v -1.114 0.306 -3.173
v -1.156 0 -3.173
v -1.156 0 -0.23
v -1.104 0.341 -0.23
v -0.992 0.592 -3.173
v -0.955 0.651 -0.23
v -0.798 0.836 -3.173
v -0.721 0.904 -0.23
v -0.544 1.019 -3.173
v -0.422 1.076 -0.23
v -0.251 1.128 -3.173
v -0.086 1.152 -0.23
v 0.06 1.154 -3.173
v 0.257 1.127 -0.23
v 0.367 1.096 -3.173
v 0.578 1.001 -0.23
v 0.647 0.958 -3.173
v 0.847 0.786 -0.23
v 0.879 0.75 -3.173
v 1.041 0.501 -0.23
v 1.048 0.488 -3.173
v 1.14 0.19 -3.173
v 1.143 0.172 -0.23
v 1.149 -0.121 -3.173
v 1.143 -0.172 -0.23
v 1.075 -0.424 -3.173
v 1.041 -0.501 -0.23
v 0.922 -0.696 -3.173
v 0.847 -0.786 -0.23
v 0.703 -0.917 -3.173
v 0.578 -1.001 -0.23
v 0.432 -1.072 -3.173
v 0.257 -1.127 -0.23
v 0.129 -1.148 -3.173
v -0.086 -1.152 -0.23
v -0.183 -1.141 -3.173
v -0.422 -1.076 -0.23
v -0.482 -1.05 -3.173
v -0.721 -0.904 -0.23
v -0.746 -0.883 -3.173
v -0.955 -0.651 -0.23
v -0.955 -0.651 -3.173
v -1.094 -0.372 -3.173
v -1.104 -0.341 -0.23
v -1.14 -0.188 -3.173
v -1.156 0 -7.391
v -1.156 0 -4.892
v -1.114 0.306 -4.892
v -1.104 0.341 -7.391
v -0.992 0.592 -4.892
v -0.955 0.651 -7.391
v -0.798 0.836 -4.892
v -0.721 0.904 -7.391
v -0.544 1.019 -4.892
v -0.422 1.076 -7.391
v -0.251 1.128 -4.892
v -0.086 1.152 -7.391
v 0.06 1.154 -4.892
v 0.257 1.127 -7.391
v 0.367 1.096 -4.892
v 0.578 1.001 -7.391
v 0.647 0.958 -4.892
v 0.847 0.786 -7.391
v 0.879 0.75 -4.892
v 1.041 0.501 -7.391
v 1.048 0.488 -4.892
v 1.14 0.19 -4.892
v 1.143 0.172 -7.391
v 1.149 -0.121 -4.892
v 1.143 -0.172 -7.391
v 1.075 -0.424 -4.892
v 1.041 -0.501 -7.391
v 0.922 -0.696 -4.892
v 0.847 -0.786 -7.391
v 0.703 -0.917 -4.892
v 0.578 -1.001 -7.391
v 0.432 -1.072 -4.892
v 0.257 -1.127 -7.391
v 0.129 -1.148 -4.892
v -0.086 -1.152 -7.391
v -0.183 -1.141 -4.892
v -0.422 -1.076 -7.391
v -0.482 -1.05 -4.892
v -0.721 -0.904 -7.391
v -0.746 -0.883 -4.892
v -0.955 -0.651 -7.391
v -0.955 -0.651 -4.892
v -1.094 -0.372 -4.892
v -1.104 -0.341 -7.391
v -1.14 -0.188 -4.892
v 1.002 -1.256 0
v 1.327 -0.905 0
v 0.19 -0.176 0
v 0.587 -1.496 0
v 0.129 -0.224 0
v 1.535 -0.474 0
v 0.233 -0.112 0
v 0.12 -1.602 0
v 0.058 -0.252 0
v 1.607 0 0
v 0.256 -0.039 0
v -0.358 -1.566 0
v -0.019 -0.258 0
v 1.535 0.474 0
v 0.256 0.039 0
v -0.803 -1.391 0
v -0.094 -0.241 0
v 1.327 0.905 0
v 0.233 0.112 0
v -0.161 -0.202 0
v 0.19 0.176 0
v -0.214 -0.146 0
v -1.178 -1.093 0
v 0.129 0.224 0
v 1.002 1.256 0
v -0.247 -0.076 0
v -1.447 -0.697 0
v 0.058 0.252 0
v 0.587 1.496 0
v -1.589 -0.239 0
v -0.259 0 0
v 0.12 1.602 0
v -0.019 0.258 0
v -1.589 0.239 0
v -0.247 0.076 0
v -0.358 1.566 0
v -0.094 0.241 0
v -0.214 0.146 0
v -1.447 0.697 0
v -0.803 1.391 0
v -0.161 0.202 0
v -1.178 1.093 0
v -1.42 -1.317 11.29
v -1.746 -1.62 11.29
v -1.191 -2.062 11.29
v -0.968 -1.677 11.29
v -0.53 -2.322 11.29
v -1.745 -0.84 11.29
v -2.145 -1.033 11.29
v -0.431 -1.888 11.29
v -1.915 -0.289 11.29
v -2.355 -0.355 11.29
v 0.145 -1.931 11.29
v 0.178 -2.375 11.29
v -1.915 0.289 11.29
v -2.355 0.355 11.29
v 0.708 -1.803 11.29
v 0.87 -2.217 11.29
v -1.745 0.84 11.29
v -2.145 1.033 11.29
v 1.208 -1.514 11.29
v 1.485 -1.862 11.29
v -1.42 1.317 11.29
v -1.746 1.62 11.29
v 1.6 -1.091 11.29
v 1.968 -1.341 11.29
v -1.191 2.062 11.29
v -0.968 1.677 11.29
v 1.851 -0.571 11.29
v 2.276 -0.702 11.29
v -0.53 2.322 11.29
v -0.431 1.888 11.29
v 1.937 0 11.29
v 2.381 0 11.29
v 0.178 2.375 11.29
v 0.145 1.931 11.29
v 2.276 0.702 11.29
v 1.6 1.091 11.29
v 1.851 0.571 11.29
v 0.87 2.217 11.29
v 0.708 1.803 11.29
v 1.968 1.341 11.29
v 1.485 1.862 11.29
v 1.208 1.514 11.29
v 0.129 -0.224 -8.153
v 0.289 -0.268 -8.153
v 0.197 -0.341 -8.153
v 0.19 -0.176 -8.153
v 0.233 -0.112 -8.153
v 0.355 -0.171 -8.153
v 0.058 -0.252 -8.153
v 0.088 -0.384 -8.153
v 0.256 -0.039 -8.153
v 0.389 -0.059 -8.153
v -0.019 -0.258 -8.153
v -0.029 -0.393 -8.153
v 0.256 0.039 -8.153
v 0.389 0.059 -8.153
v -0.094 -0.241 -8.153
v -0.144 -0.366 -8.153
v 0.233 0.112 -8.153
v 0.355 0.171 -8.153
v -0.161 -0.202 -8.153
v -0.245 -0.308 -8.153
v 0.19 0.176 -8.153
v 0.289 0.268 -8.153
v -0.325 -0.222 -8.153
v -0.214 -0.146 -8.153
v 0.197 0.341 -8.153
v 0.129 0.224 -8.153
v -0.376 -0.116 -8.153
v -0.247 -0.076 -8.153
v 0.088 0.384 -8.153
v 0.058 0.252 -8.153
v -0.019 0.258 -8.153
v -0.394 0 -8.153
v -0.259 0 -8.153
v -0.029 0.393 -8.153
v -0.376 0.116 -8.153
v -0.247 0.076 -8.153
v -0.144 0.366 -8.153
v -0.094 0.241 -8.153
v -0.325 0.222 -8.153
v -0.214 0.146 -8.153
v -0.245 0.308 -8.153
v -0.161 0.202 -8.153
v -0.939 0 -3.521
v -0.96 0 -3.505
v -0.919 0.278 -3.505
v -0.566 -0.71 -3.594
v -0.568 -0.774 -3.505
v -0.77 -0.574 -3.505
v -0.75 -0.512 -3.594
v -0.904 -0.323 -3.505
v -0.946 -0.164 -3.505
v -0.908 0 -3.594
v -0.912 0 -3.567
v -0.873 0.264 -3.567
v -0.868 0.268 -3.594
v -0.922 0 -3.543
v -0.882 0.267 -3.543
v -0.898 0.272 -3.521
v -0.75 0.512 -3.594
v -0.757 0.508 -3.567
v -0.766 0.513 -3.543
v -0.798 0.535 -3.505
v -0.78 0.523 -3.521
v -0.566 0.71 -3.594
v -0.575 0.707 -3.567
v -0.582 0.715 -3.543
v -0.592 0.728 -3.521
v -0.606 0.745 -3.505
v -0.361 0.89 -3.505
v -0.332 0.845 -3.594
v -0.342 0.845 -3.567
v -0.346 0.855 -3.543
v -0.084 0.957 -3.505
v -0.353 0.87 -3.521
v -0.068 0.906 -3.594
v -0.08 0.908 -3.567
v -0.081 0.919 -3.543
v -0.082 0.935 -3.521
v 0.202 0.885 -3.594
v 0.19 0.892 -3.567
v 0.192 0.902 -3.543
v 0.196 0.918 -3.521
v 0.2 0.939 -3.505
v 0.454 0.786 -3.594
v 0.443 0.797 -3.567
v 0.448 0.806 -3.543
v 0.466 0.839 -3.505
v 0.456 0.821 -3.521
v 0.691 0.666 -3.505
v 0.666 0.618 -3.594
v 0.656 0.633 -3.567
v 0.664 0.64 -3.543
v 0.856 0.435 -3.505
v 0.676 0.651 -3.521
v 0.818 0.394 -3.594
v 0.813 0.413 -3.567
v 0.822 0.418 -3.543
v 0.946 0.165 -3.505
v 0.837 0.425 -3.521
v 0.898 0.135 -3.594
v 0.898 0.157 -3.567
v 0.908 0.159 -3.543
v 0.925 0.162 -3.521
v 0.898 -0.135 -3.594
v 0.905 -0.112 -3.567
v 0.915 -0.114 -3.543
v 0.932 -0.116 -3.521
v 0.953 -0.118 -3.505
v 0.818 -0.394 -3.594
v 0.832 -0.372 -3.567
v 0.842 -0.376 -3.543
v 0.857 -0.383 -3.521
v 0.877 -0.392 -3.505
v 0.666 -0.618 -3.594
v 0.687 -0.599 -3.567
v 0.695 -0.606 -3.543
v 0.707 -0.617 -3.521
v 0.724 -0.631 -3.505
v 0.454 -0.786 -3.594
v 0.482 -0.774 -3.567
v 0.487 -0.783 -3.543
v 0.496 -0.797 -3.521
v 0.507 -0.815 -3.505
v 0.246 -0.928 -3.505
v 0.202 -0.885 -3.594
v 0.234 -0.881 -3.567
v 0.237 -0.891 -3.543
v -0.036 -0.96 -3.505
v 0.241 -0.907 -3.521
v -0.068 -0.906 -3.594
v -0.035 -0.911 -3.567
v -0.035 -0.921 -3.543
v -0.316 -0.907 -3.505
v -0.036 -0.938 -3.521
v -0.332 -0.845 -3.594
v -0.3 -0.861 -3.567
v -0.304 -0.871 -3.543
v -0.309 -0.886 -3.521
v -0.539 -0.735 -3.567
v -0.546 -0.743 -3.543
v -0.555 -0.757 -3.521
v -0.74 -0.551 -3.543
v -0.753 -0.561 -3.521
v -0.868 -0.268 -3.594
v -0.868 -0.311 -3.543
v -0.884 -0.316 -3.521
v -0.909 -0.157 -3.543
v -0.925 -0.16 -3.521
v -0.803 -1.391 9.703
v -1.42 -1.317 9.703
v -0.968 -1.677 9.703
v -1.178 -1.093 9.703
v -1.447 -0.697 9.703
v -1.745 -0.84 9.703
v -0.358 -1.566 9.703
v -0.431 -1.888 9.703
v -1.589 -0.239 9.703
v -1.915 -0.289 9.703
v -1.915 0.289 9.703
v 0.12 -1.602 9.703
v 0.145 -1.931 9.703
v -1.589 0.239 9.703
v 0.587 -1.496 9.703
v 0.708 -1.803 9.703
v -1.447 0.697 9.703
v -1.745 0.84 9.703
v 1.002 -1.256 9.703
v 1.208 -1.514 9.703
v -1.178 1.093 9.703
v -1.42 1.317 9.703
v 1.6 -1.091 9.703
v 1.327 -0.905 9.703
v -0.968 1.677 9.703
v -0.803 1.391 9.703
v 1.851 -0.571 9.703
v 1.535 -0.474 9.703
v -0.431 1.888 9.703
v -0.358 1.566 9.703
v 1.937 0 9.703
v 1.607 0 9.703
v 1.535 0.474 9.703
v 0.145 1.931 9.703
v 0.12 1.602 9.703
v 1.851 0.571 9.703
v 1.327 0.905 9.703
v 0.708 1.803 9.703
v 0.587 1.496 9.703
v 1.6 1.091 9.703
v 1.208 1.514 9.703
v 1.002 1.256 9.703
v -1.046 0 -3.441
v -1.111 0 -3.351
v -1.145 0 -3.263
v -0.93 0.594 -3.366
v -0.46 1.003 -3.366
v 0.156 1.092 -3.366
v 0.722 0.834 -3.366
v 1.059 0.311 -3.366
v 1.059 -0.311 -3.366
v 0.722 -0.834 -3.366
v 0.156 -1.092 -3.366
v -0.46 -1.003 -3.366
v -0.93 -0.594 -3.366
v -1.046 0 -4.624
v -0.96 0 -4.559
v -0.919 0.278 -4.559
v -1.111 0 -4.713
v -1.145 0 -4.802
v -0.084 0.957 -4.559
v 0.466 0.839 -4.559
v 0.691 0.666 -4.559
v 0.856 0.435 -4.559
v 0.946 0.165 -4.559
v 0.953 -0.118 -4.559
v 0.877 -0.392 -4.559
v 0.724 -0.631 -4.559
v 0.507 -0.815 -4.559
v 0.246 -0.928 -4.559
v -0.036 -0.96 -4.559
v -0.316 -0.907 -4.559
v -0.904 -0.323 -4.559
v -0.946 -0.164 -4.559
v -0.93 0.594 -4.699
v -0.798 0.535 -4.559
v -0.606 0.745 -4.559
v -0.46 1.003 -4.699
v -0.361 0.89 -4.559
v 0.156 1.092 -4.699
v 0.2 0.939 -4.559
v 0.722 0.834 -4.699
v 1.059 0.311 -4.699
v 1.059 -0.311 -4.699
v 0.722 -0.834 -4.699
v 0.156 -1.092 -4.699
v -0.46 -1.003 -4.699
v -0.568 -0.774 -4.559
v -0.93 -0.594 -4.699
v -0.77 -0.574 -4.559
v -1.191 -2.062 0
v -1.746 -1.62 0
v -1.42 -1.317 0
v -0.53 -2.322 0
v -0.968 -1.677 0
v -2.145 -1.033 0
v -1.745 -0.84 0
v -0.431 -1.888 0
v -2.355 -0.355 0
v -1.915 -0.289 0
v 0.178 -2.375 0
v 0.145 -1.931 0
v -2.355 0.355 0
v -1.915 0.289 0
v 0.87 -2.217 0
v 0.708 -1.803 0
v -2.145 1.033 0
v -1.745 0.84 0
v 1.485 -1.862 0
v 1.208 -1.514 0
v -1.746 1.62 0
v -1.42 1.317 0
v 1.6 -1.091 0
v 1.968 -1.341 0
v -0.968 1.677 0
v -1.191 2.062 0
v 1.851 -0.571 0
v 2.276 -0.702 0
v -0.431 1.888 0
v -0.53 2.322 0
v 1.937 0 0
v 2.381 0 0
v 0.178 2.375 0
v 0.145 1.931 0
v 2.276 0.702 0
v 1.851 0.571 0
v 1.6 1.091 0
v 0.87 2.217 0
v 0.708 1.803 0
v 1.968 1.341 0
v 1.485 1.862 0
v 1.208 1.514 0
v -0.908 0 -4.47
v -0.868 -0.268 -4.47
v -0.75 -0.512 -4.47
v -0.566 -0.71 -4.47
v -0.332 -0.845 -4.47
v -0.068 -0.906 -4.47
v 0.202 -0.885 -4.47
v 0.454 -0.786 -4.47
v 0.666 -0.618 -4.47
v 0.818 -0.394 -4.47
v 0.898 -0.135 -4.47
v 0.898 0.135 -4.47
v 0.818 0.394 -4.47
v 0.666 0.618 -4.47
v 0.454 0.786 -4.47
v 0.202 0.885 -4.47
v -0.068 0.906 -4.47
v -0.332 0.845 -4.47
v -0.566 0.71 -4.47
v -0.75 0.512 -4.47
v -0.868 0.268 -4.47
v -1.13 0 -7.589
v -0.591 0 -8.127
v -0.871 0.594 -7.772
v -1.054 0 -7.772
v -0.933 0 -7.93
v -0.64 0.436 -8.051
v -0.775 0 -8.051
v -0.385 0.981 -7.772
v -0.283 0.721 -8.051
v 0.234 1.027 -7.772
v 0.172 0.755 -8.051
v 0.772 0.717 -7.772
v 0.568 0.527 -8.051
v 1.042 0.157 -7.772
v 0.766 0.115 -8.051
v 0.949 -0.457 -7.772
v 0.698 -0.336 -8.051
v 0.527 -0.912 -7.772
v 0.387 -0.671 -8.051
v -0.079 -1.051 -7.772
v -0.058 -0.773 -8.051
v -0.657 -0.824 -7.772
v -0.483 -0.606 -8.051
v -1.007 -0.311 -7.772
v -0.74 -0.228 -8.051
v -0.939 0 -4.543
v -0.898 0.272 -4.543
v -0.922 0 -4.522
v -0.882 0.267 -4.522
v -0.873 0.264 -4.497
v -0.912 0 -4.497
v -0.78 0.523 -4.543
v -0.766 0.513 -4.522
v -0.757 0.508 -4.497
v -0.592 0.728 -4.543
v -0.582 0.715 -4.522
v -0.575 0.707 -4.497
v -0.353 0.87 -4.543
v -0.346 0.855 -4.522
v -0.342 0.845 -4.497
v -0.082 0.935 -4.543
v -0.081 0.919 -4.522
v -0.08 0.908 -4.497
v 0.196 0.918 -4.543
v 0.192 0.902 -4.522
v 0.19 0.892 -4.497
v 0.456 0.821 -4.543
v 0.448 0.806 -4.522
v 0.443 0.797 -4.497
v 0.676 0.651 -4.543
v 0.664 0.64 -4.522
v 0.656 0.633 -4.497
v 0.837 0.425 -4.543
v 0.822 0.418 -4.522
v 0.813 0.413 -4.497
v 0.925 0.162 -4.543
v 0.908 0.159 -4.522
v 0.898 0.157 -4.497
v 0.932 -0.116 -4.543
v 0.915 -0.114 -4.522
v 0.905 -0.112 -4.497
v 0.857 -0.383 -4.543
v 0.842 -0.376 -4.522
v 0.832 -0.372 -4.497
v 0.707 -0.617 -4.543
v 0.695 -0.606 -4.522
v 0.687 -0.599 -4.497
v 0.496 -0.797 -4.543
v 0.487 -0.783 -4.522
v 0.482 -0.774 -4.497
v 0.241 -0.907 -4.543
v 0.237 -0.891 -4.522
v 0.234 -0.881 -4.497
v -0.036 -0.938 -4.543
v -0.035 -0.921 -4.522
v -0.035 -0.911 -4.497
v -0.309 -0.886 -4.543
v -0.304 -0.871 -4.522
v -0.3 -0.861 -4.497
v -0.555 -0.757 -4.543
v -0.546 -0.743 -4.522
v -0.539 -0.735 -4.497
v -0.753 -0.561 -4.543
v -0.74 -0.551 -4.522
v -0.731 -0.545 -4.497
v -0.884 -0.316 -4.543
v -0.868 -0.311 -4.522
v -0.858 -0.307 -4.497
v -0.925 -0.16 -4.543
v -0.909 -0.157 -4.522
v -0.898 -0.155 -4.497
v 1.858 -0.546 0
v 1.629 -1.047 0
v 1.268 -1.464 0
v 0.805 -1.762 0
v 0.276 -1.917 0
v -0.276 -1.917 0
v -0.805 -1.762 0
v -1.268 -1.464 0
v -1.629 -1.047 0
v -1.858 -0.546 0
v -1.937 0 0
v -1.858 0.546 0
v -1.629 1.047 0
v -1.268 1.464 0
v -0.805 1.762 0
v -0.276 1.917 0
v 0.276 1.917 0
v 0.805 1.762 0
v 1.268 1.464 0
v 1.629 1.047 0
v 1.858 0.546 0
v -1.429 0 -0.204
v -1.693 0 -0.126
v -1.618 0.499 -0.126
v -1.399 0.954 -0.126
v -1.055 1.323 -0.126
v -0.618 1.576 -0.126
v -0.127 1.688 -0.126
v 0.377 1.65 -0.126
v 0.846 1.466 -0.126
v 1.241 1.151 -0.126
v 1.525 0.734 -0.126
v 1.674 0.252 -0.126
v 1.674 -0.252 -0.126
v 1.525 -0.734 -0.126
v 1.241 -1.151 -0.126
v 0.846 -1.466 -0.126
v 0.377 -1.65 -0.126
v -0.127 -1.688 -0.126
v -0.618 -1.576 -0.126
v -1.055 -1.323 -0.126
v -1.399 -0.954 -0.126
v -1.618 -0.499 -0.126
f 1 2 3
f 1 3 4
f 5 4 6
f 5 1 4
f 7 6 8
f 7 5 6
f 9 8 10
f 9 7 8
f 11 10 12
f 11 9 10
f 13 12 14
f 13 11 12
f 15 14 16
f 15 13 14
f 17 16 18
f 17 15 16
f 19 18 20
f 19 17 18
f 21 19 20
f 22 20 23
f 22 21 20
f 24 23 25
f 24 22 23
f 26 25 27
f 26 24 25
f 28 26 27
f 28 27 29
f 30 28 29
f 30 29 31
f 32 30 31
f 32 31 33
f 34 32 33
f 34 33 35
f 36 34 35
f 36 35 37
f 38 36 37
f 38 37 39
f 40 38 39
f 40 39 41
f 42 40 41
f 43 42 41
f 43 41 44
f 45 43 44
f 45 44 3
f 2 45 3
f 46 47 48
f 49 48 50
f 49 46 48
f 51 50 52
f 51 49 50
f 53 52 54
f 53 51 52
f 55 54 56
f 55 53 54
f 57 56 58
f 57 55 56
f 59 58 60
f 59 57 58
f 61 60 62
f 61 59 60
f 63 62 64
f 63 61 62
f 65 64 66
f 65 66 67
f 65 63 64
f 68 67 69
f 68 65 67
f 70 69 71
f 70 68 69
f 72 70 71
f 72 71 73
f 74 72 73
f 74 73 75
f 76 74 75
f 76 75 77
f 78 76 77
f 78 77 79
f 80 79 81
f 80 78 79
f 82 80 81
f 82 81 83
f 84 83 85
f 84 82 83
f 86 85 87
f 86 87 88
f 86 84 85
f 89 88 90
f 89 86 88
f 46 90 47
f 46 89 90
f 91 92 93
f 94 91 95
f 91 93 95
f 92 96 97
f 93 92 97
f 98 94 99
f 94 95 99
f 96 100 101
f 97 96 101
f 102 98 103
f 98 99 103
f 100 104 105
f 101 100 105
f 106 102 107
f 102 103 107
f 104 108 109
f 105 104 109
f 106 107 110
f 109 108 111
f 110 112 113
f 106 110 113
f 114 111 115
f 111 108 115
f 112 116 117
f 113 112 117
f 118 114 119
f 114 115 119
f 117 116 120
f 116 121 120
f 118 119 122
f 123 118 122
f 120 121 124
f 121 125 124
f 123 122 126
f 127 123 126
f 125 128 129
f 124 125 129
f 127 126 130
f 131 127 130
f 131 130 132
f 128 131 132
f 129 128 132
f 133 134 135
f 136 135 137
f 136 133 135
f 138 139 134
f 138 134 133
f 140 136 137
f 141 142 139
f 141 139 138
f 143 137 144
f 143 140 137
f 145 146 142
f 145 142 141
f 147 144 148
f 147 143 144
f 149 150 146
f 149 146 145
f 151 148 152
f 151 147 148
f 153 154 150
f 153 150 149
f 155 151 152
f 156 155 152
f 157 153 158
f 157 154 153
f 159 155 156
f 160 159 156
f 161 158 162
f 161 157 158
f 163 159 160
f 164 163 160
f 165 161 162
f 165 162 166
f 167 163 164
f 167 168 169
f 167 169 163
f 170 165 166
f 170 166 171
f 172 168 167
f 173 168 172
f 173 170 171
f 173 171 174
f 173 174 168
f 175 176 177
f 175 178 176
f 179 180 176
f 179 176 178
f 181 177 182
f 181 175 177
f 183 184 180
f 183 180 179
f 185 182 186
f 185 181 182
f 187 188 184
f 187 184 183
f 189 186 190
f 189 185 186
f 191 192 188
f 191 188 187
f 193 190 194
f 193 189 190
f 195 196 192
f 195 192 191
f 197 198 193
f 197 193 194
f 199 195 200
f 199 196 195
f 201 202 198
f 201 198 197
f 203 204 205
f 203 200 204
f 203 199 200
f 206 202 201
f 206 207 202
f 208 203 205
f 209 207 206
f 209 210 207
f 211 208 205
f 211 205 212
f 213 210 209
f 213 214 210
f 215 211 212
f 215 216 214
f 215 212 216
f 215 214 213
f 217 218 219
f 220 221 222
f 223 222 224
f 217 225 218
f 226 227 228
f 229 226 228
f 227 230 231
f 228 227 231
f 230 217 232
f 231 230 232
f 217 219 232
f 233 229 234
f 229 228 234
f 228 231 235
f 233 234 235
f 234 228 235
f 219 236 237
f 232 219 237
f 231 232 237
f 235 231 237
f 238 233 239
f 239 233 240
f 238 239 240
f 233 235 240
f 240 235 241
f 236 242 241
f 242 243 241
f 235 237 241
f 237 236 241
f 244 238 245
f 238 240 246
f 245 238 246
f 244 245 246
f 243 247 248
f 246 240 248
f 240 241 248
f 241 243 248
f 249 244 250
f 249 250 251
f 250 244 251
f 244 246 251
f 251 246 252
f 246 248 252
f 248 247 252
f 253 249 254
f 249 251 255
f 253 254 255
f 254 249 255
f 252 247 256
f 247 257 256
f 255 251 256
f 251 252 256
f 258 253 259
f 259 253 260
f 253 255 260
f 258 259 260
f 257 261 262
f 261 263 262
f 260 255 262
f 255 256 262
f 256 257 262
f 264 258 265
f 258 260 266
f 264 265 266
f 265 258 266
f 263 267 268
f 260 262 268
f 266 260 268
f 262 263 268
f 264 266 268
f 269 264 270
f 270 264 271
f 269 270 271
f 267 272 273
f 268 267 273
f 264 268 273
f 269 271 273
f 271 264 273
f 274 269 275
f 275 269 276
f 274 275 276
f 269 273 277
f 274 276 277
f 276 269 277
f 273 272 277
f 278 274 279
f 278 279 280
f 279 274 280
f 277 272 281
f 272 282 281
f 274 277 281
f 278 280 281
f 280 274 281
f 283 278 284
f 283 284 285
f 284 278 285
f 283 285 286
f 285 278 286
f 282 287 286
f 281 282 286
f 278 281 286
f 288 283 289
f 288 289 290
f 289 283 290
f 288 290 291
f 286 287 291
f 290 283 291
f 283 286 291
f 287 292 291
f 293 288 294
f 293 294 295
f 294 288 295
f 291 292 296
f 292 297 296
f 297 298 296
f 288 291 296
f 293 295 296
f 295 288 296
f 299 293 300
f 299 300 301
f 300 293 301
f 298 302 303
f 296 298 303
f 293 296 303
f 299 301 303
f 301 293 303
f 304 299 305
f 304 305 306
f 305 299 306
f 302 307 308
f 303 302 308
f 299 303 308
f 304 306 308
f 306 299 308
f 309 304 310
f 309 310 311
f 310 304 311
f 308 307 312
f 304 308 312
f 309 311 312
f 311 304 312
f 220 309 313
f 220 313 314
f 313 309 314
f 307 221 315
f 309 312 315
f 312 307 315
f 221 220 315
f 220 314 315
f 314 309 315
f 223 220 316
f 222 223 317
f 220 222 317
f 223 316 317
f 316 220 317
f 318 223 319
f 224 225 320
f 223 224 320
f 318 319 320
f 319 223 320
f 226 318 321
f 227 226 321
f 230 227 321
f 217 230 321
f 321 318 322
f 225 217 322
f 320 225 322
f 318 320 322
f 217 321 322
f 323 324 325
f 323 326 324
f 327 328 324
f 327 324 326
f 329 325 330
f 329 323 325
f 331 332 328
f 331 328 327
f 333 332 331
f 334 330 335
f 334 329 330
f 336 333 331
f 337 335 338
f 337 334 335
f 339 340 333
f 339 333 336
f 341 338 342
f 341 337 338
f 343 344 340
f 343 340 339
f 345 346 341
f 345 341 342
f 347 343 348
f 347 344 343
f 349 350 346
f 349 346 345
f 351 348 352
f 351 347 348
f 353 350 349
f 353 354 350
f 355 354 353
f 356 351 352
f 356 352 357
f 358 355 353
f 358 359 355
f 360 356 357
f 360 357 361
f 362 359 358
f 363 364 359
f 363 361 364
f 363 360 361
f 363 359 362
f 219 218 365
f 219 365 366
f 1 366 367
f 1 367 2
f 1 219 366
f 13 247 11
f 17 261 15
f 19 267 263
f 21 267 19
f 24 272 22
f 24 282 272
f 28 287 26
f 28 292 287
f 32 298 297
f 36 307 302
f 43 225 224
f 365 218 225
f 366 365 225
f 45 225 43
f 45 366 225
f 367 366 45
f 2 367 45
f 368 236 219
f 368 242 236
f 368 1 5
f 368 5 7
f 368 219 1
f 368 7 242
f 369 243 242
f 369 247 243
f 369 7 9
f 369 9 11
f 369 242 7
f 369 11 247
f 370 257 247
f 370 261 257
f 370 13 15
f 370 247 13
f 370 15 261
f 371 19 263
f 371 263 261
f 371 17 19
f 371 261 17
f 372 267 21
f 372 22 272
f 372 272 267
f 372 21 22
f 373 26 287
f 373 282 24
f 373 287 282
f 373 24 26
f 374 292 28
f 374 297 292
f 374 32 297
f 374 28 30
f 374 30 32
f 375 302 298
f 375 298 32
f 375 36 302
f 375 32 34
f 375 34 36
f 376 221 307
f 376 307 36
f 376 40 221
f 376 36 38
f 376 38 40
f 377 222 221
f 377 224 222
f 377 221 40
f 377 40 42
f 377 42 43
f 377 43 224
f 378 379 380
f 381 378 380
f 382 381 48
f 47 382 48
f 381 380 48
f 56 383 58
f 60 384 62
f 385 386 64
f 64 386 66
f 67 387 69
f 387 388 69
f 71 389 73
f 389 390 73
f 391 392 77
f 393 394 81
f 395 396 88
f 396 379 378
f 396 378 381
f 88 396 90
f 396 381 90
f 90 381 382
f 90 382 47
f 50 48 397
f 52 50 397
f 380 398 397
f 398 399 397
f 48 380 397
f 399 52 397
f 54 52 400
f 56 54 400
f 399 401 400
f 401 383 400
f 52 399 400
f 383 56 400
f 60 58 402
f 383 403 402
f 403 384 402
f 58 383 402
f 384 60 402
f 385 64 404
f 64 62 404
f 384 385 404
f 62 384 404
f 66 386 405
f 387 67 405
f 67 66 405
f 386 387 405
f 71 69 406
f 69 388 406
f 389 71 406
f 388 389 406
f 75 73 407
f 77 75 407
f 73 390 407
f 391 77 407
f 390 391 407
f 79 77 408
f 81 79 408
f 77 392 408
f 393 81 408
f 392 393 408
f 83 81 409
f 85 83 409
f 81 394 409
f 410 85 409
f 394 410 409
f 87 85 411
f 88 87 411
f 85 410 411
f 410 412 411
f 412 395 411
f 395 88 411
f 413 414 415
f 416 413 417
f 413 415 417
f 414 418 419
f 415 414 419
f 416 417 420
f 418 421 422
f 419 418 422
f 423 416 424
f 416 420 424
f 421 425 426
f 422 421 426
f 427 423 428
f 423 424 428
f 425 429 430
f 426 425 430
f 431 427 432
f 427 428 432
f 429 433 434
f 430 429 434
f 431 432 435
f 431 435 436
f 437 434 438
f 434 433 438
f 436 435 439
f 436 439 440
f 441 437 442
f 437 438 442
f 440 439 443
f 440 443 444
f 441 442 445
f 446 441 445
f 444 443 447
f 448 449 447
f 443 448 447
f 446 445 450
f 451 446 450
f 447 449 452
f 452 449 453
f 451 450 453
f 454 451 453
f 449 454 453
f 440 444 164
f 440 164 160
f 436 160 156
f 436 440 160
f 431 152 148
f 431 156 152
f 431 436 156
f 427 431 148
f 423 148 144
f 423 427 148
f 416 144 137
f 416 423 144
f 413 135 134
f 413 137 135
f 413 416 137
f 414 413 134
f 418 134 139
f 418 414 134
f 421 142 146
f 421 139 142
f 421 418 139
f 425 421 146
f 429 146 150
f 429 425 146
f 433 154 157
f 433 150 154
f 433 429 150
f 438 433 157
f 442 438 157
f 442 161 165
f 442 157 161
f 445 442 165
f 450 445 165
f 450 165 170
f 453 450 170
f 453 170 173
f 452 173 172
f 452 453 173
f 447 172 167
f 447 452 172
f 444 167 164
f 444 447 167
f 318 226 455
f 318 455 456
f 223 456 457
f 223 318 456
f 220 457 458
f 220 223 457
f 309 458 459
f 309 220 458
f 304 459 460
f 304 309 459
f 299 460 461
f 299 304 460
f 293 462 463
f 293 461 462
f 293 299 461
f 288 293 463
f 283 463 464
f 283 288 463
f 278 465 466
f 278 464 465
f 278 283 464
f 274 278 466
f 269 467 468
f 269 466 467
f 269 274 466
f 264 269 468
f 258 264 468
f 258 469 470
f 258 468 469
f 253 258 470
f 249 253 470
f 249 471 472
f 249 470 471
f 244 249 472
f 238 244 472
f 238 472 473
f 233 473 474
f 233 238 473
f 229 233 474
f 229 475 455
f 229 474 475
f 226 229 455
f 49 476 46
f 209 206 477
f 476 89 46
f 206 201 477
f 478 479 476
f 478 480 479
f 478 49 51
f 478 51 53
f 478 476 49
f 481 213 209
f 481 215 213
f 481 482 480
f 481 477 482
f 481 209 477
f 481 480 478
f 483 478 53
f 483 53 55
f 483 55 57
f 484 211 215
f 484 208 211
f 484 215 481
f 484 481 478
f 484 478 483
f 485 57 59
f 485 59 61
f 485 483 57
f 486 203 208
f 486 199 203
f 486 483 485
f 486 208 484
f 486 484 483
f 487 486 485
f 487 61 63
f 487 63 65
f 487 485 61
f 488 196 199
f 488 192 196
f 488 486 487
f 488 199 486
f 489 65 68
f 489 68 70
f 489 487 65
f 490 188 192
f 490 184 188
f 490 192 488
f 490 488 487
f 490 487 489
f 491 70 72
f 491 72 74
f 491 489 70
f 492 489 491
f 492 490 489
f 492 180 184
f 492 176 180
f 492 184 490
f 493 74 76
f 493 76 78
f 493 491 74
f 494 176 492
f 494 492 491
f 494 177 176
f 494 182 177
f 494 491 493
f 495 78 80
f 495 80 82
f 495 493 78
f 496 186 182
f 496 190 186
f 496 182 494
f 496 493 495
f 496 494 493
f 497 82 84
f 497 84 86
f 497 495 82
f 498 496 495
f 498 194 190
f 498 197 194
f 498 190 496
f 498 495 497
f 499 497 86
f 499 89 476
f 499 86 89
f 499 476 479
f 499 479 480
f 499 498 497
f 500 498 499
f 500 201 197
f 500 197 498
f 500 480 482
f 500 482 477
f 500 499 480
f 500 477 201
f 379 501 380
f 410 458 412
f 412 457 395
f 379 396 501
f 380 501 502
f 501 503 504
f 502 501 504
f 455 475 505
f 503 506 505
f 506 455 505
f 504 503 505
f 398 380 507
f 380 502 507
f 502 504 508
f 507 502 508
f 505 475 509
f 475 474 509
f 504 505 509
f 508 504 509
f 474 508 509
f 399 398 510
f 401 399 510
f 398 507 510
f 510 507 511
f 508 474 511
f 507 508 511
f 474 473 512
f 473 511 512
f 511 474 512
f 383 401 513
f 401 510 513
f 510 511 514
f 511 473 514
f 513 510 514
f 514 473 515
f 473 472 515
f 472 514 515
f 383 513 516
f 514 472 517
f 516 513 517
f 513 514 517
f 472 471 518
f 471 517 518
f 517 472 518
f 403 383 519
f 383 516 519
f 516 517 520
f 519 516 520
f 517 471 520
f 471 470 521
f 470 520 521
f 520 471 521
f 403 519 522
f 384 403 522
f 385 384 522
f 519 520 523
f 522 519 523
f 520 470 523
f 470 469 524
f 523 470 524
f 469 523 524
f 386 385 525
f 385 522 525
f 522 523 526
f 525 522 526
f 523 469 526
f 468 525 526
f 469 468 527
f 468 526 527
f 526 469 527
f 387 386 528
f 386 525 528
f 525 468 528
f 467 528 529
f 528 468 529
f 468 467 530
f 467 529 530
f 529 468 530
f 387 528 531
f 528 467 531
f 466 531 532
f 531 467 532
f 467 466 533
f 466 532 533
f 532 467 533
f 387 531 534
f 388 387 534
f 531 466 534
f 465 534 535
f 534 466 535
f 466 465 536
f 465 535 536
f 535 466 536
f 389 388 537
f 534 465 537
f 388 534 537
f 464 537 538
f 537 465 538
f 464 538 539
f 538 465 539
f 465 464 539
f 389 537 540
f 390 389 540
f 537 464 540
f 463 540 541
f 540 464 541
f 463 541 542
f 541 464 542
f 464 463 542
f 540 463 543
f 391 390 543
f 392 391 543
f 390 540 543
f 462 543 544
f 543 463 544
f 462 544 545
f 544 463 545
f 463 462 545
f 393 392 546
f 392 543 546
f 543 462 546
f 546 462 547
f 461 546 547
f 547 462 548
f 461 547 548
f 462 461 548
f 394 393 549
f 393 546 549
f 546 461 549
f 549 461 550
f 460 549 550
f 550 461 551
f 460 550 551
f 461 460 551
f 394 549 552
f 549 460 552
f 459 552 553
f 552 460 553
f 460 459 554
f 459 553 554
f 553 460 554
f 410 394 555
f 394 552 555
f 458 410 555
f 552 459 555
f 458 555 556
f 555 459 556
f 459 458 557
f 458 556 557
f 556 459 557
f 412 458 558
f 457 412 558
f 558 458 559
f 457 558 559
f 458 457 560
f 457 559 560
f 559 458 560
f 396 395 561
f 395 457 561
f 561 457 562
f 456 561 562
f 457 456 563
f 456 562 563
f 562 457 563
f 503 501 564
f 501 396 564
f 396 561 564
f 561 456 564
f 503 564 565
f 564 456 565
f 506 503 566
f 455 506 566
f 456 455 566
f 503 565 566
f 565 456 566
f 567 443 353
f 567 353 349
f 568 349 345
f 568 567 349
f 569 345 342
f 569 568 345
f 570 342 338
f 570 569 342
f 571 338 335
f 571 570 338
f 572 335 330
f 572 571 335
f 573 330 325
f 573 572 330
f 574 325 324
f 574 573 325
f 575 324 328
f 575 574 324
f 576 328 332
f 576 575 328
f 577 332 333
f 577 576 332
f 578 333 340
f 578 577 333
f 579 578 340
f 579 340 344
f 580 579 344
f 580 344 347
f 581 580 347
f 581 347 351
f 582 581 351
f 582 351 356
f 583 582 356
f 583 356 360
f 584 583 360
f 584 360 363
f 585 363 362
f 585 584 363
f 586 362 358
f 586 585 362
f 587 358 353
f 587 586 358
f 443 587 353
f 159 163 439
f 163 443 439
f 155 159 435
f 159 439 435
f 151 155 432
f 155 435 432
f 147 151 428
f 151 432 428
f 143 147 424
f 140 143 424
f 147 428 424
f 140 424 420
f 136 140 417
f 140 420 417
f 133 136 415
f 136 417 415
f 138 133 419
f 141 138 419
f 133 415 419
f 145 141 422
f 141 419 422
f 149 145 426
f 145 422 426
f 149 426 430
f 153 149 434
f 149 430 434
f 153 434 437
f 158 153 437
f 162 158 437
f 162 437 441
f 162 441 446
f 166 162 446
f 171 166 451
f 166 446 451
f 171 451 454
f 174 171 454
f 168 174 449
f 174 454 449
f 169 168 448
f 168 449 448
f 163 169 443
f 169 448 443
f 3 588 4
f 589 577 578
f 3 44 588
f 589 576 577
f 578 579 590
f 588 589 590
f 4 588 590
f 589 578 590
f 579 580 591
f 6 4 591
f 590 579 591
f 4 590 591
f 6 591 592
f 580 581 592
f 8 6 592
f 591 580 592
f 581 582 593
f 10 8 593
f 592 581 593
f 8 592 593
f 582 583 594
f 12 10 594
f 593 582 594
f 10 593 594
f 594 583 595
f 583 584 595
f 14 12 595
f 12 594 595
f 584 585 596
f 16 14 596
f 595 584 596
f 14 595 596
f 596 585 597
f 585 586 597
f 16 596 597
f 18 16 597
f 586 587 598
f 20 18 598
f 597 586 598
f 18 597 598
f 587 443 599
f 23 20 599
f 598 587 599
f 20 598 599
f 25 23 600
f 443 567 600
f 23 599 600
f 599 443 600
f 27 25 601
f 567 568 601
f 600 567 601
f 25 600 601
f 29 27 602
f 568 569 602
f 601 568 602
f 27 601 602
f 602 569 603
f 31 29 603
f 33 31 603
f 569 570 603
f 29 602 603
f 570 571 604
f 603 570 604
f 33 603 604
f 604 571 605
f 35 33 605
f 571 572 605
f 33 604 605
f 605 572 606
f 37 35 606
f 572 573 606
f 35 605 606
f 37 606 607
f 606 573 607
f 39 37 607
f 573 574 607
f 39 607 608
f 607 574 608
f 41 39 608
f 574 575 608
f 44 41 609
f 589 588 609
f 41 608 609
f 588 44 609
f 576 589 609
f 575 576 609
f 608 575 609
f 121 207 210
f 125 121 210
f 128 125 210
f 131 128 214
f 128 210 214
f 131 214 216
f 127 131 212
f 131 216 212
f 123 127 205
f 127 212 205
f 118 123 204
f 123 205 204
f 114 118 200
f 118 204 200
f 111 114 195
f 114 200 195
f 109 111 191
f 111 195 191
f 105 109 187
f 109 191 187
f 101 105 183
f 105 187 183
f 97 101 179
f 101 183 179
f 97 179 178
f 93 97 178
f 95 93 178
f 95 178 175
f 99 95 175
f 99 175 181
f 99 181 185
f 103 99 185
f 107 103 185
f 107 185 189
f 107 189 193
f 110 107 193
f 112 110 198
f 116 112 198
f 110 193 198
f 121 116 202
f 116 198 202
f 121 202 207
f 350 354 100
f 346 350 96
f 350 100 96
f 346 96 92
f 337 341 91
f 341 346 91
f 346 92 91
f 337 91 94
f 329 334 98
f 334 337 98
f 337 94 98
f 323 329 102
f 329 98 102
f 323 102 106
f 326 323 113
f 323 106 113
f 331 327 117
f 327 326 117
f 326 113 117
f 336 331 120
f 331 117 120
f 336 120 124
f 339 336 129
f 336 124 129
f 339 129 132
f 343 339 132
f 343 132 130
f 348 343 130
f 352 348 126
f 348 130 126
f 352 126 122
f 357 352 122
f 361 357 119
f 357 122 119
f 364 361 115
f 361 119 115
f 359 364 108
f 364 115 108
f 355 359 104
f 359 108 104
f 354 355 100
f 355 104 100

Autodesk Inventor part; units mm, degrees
ref_plane "YZ Plane" through (0, 0, 0) normal (1, 0, 0) x (0, 1, 0)
ref_plane "XZ Plane" through (0, 0, 0) normal (0, 1, 0) x (-1, 0, 0)
ref_plane "XY Plane" through (0, 0, 0) normal (0, 0, 1) x (1, 0, 0)
sketch "Sketch1" plane through (0, 0, 0) normal (0, 0, 1) x (1, 0, 0)
  circle A0 centre (0, 0) radius 2.3813
  dimension "d0" = 4.7625
extrude "Extrusion1" add sketch "Sketch1" along normal blind 11.2903
shell "Shell1" thickness 0.4445 removed faces 2 at (-0.7707, 0.19, 0) at (-0.7707, 0.19, 11.2903)
sketch "Sketch2" plane through (0, 0, 0) normal (0, 1, 0) x (-1, 0, 0)
  line L0 (2.3813, 11.2903) -> (2.3813, 0) projected
  line L1 (2.3813, 0) -> (1.9368, 0) projected
  line L2 (1.9368, 0) -> (1.9368, 11.2903) projected
  line L3 (1.9368, 11.2903) -> (2.3813, 11.2903) projected
  line L4 (-2.3813, 0) -> (-2.3813, 11.2903) projected
  line L5 (-2.3813, 11.2903) -> (-1.9368, 11.2903) projected
  line L6 (-1.9368, 11.2903) -> (-1.9368, 0) projected
  line L7 (-1.9368, 0) -> (-2.3813, 0) projected
  line L8 (1.9368, 0) -> (0, 0) construction
  line L9 (0, 0) -> (0, -8.1534) construction
  line L10 (1.1557, -8.1534) -> (0, -8.1534)
  line L11 (-1.1557, -8.1534) -> (-1.1557, 0) construction
  line L12 (-1.1557, 0) -> (0, 0) construction
  line L13 (-1.1557, -4.572) -> (-1.1557, -3.4925) construction
  line L14 (0.9081, -4.572) -> (0.9081, -3.4925)
  line L15 (-0.908, -4.572) -> (-0.908, -3.4925) construction
  line L16 (1.1557, -0.2302) -> (1.1557, -3.4925)
  line L17 (1.1557, -4.572) -> (1.1557, -8.1534)
  line L18 (1.1557, -4.572) -> (0.9081, -4.572)
  line L19 (0, -4.572) -> (-1.1557, -4.572) construction
  line L20 (-1.1557, -3.4925) -> (0, -3.4925) construction
  line L21 (0.9081, -3.4925) -> (1.1557, -3.4925)
  line L22 (0, -8.1534) -> (-1.1557, -8.1534) construction
  line L23 (0, 0) -> (-1.9368, 0) construction
  line L24 (0, -8.1534) -> (0, 0)
  line L25 (0, 0) -> (1.1557, 0)
  line L26 (1.1557, 0) -> (1.9368, 0)
  arc A0 (1.1557, -0.2302) -> (1.9368, 0) centre (1.1557, 1.2101) ccw
  line L27 (1.1557, -0.2302) -> (0, -0.2302) construction
  dimension "d4" = 8.1534
  dimension "d8" = 1.8161
  dimension "d13" = 1.1557
revolve "Revolution1" add sketch "Sketch2" angle 360 about axis through (0, 0, 0) along (0, 0, -1) separate body contours A0 L16 L21 L14 L18 L17 L10 L24 L25 L26
fillet "Fillet1" radius 0.762 1 edges at (1.1557, 0, -8.1534)
sketch "Sketch3" plane through (0, 0, -8.1534) normal (0, 0, -1) x (-1, 0, 0)
  circle A0 centre (0, 0) radius 0.3937 projected
  circle A1 centre (0, 0) radius 0.3937 projected
  circle A2 centre (0, 0) radius 0.2586
extrude "Extrusion2" cut sketch "Sketch3" against normal blind 11.2903 contours A2 bodies 1 2
fillet "Fillet2" radius 0.1016 2 edges at (0.908, 0, -4.572) (0.908, 0, -3.4925)
fillet "Fillet3" radius 0.381 2 edges at (1.1557, 0, -3.4925) (1.1557, 0, -4.572)
sketch "Sketch5" plane through (0, 0, 0) normal (0, 0, 1) x (1, 0, 0)
  circle A0 centre (0, 0) radius 0.2586 projected
  circle A1 centre (0, 0) radius 1.9368 projected
  circle A2 centre (0, 0) radius 1.6066
  dimension "d17" = 0.3302
extrude "Extrusion3" add sketch "Sketch5" along normal blind 9.7028 contours A1 bodies 2
properties part number "point 091 male pin red"
